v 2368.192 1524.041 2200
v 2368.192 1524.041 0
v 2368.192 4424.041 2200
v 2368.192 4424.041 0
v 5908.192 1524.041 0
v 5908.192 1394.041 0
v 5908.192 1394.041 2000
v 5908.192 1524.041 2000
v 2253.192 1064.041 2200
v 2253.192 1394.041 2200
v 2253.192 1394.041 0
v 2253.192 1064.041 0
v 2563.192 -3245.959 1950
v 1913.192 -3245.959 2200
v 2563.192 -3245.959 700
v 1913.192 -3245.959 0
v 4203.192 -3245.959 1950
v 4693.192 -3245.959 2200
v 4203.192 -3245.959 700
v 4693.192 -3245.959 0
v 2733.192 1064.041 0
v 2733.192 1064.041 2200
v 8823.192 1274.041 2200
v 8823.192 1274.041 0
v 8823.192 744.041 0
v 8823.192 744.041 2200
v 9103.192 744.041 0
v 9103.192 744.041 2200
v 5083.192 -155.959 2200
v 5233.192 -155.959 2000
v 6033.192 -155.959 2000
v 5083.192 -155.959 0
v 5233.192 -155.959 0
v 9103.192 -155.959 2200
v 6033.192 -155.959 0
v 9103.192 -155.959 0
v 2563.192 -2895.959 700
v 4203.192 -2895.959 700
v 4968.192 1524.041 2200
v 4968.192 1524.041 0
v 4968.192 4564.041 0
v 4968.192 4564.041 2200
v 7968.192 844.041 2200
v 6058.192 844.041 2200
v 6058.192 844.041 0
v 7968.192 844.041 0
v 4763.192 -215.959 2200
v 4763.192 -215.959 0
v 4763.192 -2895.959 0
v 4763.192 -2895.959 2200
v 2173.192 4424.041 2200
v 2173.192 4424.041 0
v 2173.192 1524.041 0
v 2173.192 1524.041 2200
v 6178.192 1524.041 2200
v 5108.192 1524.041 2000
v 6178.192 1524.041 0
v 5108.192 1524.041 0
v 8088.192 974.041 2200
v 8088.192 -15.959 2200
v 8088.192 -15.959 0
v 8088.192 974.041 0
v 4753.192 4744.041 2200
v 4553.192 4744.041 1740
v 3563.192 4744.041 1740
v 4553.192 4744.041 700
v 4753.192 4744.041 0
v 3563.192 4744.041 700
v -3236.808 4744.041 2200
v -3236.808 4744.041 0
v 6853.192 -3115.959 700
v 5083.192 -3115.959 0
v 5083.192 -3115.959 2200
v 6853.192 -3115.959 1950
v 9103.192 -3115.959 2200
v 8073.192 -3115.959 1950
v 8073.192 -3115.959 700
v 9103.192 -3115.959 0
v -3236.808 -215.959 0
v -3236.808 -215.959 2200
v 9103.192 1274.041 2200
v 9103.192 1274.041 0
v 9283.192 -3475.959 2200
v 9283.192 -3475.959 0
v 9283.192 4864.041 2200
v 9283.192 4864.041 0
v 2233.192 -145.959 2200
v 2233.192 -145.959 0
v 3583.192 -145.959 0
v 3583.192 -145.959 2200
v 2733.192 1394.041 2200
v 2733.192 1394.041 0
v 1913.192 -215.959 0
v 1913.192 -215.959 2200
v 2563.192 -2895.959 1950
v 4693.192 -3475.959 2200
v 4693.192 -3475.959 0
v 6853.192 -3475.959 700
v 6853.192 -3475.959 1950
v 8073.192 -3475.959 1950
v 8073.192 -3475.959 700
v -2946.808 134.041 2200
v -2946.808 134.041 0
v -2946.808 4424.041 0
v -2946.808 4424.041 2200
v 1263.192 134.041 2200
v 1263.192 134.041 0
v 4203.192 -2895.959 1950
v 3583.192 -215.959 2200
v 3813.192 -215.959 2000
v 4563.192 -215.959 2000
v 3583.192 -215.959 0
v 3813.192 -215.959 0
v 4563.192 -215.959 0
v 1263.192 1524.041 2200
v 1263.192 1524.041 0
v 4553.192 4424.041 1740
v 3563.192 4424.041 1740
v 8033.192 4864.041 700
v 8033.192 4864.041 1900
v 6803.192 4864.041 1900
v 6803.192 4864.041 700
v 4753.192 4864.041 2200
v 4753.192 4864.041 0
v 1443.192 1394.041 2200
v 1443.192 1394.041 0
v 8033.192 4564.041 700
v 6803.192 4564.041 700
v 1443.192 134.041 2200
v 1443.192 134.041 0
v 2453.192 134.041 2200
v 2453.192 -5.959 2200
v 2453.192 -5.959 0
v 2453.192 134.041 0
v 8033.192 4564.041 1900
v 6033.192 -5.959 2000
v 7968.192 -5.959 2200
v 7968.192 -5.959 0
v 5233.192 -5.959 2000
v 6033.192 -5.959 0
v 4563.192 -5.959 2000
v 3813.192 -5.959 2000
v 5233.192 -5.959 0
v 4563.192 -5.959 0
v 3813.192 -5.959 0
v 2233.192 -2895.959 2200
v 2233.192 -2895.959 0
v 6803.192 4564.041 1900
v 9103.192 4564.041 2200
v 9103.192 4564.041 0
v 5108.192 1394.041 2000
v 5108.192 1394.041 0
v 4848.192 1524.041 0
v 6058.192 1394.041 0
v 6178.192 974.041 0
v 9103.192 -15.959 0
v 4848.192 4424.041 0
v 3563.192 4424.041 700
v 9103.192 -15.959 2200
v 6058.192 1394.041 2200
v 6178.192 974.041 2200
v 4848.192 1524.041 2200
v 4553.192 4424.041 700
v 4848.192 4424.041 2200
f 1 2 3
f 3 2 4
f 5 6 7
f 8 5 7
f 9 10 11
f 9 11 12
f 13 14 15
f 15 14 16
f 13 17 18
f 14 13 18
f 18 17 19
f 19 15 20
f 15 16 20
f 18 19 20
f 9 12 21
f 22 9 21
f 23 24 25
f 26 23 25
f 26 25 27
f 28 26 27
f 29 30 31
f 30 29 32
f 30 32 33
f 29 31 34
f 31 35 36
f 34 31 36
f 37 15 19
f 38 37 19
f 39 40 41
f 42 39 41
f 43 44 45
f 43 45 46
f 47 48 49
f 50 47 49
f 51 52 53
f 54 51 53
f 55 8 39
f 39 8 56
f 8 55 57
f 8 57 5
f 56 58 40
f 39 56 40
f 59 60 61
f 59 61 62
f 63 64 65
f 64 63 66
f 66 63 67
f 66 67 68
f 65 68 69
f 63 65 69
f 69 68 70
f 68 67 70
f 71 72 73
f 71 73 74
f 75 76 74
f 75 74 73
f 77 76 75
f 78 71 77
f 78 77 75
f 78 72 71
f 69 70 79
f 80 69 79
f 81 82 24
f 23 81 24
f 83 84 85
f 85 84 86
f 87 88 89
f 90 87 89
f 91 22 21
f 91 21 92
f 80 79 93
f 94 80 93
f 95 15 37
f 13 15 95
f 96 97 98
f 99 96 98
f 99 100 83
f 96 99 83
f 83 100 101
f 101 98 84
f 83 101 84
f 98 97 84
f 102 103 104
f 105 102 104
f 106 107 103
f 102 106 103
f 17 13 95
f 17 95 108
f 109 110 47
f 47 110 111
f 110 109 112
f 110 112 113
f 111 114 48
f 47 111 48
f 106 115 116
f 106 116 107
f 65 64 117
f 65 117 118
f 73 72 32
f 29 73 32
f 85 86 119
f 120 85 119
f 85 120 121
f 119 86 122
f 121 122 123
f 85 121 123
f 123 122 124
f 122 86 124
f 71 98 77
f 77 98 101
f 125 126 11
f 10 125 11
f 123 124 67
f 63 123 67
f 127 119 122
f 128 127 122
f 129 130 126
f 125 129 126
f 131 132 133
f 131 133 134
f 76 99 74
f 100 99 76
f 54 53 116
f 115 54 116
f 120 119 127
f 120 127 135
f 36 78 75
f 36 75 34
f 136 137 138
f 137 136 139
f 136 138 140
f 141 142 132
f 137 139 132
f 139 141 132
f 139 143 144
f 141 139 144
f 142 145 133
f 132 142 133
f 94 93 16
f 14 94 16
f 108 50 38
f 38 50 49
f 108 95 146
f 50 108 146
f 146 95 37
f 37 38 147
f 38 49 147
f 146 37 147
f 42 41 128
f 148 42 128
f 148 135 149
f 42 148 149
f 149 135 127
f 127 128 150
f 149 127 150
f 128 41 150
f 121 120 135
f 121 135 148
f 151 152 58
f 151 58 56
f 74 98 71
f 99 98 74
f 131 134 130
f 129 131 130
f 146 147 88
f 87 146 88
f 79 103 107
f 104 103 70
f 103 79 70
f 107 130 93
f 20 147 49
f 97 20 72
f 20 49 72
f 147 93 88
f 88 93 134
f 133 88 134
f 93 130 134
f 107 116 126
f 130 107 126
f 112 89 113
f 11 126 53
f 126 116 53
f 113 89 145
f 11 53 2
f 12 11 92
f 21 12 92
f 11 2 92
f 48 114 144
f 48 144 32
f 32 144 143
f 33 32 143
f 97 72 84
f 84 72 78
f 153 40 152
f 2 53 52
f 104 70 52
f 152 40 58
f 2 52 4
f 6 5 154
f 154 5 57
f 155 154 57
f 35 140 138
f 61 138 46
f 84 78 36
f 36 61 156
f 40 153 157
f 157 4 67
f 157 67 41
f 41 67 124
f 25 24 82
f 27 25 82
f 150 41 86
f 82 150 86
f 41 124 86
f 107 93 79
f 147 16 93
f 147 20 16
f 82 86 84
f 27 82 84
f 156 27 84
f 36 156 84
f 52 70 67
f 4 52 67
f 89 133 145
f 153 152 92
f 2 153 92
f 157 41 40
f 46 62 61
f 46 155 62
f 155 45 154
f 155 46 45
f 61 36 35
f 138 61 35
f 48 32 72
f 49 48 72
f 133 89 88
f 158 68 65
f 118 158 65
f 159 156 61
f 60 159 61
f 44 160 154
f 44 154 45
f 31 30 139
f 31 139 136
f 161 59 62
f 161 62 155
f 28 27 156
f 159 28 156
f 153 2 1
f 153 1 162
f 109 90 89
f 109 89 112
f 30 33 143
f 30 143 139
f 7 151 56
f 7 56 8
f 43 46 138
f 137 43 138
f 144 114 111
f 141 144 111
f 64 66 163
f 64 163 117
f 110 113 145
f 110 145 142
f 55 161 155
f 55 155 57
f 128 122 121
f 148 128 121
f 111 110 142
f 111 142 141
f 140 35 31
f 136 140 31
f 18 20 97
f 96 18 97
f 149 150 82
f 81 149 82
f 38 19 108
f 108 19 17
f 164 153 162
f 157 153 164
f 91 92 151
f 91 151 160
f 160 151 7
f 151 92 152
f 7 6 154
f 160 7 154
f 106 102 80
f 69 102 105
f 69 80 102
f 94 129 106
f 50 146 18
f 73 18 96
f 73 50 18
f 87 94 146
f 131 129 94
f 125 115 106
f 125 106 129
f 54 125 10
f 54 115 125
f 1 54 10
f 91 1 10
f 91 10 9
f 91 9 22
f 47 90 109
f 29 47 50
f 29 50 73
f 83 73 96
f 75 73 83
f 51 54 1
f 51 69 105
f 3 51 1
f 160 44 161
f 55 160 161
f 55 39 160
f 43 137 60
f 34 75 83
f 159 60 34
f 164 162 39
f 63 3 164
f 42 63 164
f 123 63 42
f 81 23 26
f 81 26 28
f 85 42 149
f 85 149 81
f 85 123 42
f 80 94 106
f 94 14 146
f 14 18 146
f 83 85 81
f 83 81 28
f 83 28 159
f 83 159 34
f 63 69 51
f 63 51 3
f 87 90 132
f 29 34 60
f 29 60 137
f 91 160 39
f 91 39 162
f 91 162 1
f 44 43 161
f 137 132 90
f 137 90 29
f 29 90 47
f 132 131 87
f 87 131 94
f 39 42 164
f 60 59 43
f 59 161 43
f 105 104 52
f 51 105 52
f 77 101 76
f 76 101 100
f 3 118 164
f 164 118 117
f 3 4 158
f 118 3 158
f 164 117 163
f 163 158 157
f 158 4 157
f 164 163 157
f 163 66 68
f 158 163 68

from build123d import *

# Parameters (mm, degrees)
F0_W      = 4020
F0_H      = 2960
F0_W_2    = 2480
F0_H_2    = 2900
F1_DEPTH  = 2200
F2_W      = 800
F2_H      = 2000
F3_DEPTH  = 130
F4_W      = 800
F4_H      = 2000
F5_DEPTH  = 150
F6_W      = 1640
F6_H      = 1250
F7_DEPTH  = 350
F8_W      = 1220
F8_H      = 1250
F9_DEPTH  = 360
F10_W     = 990
F10_H     = 1040
F11_DEPTH = 320
F12_W     = 1230
F12_H     = 1200
F13_DEPTH = 300
F14_W     = 750
F14_H     = 2000
F15_DEPTH = 210


with BuildPart() as f1:
    # F0 (on Top) → F1 (new body)
    with BuildSketch(Plane.XY):
        Polygon((-3236.807995, -215.958515), (1913.192005, -215.958515), (1913.192005, -3245.958515), (4693.192005, -3245.958515), (4693.192005, -3475.958515), (9283.192005, -3475.958515), (9283.192005, 4864.041485), (4753.192005, 4864.041485), (4753.192005, 4744.041485), (-3236.807995, 4744.041485), align=None)
        Polygon((4763.192005, -215.958515), (4763.192005, -2895.958515), (2233.192005, -2895.958515), (2233.192005, -145.958515), (3583.192005, -145.958515), (3583.192005, -215.958515), align=None, mode=Mode.SUBTRACT)
        with Locations((7093.192005, -1635.958515)):
            Rectangle(F0_W, F0_H, mode=Mode.SUBTRACT)
        Polygon((-2946.807995, 4424.041485), (2173.192005, 4424.041485), (2173.192005, 1524.041485), (1263.192005, 1524.041485), (1263.192005, 134.041485), (-2946.807995, 134.041485), align=None, mode=Mode.SUBTRACT)
        Polygon((2733.192005, 1394.041485), (6058.192005, 1394.041485), (6058.192005, 844.041485), (7968.192005, 844.041485), (7968.192005, -5.958515), (2453.192005, -5.958515), (2453.192005, 134.041485), (1443.192005, 134.041485), (1443.192005, 1394.041485), (2253.192005, 1394.041485), (2253.192005, 1064.041485), (2733.192005, 1064.041485), align=None, mode=Mode.SUBTRACT)
        Polygon((4968.192005, 1524.041485), (4968.192005, 4564.041485), (9103.192005, 4564.041485), (9103.192005, 1274.041485), (8823.192005, 1274.041485), (8823.192005, 744.041485), (9103.192005, 744.041485), (9103.192005, -15.958515), (8088.192005, -15.958515), (8088.192005, 974.041485), (6178.192005, 974.041485), (6178.192005, 1524.041485), align=None, mode=Mode.SUBTRACT)
        with Locations((3608.192005, 2974.041485)):
            Rectangle(F0_W_2, F0_H_2, mode=Mode.SUBTRACT)
    extrude(amount=F1_DEPTH)

    # F2 (on face) → F3 (cut, through all)
    with BuildSketch(Plane.XZ.offset(-1394.041485)):
        with Locations((5508.192005, 1000)):
            Rectangle(F2_W, F2_H)
    extrude(amount=-F3_DEPTH, mode=Mode.SUBTRACT)

    # F4 (on face) → F5 (cut, through all)
    with BuildSketch(Plane.XZ.offset(155.958515)):
        with Locations((5633.192005, 1000)):
            Rectangle(F4_W, F4_H)
    extrude(amount=-F5_DEPTH, mode=Mode.SUBTRACT)

    # F6 (on face) → F7 (cut, through all)
    with BuildSketch(Plane.XZ.offset(3245.958515)):
        with Locations((3383.192005, 1325)):
            Rectangle(F6_W, F6_H)
    extrude(amount=-F7_DEPTH, mode=Mode.SUBTRACT)

    # F8 (on face) → F9 (cut, through all)
    with BuildSketch(Plane.XZ.offset(3475.958515)):
        with Locations((7463.192005, 1325)):
            Rectangle(F8_W, F8_H)
    extrude(amount=-F9_DEPTH, mode=Mode.SUBTRACT)

    # F10 (on face) → F11 (cut, through all)
    with BuildSketch(Plane(origin=(0, 4744.041485, 0), x_dir=(-1, 0, 0), z_dir=(0, 1, 0))):
        with Locations((-4058.192005, 1220)):
            Rectangle(F10_W, F10_H)
    extrude(amount=-F11_DEPTH, mode=Mode.SUBTRACT)

    # F12 (on face) → F13 (cut, through all)
    with BuildSketch(Plane(origin=(0, 4864.041485, 0), x_dir=(-1, 0, 0), z_dir=(0, 1, 0))):
        with Locations((-7418.192005, 1300)):
            Rectangle(F12_W, F12_H)
    extrude(amount=-F13_DEPTH, mode=Mode.SUBTRACT)

    # F14 (on face) → F15 (cut, through all)
    with BuildSketch(Plane.XZ.offset(215.958515)):
        with Locations((4188.192005, 1000)):
            Rectangle(F14_W, F14_H)
    extrude(amount=-F15_DEPTH, mode=Mode.SUBTRACT)


solid = f1.part
